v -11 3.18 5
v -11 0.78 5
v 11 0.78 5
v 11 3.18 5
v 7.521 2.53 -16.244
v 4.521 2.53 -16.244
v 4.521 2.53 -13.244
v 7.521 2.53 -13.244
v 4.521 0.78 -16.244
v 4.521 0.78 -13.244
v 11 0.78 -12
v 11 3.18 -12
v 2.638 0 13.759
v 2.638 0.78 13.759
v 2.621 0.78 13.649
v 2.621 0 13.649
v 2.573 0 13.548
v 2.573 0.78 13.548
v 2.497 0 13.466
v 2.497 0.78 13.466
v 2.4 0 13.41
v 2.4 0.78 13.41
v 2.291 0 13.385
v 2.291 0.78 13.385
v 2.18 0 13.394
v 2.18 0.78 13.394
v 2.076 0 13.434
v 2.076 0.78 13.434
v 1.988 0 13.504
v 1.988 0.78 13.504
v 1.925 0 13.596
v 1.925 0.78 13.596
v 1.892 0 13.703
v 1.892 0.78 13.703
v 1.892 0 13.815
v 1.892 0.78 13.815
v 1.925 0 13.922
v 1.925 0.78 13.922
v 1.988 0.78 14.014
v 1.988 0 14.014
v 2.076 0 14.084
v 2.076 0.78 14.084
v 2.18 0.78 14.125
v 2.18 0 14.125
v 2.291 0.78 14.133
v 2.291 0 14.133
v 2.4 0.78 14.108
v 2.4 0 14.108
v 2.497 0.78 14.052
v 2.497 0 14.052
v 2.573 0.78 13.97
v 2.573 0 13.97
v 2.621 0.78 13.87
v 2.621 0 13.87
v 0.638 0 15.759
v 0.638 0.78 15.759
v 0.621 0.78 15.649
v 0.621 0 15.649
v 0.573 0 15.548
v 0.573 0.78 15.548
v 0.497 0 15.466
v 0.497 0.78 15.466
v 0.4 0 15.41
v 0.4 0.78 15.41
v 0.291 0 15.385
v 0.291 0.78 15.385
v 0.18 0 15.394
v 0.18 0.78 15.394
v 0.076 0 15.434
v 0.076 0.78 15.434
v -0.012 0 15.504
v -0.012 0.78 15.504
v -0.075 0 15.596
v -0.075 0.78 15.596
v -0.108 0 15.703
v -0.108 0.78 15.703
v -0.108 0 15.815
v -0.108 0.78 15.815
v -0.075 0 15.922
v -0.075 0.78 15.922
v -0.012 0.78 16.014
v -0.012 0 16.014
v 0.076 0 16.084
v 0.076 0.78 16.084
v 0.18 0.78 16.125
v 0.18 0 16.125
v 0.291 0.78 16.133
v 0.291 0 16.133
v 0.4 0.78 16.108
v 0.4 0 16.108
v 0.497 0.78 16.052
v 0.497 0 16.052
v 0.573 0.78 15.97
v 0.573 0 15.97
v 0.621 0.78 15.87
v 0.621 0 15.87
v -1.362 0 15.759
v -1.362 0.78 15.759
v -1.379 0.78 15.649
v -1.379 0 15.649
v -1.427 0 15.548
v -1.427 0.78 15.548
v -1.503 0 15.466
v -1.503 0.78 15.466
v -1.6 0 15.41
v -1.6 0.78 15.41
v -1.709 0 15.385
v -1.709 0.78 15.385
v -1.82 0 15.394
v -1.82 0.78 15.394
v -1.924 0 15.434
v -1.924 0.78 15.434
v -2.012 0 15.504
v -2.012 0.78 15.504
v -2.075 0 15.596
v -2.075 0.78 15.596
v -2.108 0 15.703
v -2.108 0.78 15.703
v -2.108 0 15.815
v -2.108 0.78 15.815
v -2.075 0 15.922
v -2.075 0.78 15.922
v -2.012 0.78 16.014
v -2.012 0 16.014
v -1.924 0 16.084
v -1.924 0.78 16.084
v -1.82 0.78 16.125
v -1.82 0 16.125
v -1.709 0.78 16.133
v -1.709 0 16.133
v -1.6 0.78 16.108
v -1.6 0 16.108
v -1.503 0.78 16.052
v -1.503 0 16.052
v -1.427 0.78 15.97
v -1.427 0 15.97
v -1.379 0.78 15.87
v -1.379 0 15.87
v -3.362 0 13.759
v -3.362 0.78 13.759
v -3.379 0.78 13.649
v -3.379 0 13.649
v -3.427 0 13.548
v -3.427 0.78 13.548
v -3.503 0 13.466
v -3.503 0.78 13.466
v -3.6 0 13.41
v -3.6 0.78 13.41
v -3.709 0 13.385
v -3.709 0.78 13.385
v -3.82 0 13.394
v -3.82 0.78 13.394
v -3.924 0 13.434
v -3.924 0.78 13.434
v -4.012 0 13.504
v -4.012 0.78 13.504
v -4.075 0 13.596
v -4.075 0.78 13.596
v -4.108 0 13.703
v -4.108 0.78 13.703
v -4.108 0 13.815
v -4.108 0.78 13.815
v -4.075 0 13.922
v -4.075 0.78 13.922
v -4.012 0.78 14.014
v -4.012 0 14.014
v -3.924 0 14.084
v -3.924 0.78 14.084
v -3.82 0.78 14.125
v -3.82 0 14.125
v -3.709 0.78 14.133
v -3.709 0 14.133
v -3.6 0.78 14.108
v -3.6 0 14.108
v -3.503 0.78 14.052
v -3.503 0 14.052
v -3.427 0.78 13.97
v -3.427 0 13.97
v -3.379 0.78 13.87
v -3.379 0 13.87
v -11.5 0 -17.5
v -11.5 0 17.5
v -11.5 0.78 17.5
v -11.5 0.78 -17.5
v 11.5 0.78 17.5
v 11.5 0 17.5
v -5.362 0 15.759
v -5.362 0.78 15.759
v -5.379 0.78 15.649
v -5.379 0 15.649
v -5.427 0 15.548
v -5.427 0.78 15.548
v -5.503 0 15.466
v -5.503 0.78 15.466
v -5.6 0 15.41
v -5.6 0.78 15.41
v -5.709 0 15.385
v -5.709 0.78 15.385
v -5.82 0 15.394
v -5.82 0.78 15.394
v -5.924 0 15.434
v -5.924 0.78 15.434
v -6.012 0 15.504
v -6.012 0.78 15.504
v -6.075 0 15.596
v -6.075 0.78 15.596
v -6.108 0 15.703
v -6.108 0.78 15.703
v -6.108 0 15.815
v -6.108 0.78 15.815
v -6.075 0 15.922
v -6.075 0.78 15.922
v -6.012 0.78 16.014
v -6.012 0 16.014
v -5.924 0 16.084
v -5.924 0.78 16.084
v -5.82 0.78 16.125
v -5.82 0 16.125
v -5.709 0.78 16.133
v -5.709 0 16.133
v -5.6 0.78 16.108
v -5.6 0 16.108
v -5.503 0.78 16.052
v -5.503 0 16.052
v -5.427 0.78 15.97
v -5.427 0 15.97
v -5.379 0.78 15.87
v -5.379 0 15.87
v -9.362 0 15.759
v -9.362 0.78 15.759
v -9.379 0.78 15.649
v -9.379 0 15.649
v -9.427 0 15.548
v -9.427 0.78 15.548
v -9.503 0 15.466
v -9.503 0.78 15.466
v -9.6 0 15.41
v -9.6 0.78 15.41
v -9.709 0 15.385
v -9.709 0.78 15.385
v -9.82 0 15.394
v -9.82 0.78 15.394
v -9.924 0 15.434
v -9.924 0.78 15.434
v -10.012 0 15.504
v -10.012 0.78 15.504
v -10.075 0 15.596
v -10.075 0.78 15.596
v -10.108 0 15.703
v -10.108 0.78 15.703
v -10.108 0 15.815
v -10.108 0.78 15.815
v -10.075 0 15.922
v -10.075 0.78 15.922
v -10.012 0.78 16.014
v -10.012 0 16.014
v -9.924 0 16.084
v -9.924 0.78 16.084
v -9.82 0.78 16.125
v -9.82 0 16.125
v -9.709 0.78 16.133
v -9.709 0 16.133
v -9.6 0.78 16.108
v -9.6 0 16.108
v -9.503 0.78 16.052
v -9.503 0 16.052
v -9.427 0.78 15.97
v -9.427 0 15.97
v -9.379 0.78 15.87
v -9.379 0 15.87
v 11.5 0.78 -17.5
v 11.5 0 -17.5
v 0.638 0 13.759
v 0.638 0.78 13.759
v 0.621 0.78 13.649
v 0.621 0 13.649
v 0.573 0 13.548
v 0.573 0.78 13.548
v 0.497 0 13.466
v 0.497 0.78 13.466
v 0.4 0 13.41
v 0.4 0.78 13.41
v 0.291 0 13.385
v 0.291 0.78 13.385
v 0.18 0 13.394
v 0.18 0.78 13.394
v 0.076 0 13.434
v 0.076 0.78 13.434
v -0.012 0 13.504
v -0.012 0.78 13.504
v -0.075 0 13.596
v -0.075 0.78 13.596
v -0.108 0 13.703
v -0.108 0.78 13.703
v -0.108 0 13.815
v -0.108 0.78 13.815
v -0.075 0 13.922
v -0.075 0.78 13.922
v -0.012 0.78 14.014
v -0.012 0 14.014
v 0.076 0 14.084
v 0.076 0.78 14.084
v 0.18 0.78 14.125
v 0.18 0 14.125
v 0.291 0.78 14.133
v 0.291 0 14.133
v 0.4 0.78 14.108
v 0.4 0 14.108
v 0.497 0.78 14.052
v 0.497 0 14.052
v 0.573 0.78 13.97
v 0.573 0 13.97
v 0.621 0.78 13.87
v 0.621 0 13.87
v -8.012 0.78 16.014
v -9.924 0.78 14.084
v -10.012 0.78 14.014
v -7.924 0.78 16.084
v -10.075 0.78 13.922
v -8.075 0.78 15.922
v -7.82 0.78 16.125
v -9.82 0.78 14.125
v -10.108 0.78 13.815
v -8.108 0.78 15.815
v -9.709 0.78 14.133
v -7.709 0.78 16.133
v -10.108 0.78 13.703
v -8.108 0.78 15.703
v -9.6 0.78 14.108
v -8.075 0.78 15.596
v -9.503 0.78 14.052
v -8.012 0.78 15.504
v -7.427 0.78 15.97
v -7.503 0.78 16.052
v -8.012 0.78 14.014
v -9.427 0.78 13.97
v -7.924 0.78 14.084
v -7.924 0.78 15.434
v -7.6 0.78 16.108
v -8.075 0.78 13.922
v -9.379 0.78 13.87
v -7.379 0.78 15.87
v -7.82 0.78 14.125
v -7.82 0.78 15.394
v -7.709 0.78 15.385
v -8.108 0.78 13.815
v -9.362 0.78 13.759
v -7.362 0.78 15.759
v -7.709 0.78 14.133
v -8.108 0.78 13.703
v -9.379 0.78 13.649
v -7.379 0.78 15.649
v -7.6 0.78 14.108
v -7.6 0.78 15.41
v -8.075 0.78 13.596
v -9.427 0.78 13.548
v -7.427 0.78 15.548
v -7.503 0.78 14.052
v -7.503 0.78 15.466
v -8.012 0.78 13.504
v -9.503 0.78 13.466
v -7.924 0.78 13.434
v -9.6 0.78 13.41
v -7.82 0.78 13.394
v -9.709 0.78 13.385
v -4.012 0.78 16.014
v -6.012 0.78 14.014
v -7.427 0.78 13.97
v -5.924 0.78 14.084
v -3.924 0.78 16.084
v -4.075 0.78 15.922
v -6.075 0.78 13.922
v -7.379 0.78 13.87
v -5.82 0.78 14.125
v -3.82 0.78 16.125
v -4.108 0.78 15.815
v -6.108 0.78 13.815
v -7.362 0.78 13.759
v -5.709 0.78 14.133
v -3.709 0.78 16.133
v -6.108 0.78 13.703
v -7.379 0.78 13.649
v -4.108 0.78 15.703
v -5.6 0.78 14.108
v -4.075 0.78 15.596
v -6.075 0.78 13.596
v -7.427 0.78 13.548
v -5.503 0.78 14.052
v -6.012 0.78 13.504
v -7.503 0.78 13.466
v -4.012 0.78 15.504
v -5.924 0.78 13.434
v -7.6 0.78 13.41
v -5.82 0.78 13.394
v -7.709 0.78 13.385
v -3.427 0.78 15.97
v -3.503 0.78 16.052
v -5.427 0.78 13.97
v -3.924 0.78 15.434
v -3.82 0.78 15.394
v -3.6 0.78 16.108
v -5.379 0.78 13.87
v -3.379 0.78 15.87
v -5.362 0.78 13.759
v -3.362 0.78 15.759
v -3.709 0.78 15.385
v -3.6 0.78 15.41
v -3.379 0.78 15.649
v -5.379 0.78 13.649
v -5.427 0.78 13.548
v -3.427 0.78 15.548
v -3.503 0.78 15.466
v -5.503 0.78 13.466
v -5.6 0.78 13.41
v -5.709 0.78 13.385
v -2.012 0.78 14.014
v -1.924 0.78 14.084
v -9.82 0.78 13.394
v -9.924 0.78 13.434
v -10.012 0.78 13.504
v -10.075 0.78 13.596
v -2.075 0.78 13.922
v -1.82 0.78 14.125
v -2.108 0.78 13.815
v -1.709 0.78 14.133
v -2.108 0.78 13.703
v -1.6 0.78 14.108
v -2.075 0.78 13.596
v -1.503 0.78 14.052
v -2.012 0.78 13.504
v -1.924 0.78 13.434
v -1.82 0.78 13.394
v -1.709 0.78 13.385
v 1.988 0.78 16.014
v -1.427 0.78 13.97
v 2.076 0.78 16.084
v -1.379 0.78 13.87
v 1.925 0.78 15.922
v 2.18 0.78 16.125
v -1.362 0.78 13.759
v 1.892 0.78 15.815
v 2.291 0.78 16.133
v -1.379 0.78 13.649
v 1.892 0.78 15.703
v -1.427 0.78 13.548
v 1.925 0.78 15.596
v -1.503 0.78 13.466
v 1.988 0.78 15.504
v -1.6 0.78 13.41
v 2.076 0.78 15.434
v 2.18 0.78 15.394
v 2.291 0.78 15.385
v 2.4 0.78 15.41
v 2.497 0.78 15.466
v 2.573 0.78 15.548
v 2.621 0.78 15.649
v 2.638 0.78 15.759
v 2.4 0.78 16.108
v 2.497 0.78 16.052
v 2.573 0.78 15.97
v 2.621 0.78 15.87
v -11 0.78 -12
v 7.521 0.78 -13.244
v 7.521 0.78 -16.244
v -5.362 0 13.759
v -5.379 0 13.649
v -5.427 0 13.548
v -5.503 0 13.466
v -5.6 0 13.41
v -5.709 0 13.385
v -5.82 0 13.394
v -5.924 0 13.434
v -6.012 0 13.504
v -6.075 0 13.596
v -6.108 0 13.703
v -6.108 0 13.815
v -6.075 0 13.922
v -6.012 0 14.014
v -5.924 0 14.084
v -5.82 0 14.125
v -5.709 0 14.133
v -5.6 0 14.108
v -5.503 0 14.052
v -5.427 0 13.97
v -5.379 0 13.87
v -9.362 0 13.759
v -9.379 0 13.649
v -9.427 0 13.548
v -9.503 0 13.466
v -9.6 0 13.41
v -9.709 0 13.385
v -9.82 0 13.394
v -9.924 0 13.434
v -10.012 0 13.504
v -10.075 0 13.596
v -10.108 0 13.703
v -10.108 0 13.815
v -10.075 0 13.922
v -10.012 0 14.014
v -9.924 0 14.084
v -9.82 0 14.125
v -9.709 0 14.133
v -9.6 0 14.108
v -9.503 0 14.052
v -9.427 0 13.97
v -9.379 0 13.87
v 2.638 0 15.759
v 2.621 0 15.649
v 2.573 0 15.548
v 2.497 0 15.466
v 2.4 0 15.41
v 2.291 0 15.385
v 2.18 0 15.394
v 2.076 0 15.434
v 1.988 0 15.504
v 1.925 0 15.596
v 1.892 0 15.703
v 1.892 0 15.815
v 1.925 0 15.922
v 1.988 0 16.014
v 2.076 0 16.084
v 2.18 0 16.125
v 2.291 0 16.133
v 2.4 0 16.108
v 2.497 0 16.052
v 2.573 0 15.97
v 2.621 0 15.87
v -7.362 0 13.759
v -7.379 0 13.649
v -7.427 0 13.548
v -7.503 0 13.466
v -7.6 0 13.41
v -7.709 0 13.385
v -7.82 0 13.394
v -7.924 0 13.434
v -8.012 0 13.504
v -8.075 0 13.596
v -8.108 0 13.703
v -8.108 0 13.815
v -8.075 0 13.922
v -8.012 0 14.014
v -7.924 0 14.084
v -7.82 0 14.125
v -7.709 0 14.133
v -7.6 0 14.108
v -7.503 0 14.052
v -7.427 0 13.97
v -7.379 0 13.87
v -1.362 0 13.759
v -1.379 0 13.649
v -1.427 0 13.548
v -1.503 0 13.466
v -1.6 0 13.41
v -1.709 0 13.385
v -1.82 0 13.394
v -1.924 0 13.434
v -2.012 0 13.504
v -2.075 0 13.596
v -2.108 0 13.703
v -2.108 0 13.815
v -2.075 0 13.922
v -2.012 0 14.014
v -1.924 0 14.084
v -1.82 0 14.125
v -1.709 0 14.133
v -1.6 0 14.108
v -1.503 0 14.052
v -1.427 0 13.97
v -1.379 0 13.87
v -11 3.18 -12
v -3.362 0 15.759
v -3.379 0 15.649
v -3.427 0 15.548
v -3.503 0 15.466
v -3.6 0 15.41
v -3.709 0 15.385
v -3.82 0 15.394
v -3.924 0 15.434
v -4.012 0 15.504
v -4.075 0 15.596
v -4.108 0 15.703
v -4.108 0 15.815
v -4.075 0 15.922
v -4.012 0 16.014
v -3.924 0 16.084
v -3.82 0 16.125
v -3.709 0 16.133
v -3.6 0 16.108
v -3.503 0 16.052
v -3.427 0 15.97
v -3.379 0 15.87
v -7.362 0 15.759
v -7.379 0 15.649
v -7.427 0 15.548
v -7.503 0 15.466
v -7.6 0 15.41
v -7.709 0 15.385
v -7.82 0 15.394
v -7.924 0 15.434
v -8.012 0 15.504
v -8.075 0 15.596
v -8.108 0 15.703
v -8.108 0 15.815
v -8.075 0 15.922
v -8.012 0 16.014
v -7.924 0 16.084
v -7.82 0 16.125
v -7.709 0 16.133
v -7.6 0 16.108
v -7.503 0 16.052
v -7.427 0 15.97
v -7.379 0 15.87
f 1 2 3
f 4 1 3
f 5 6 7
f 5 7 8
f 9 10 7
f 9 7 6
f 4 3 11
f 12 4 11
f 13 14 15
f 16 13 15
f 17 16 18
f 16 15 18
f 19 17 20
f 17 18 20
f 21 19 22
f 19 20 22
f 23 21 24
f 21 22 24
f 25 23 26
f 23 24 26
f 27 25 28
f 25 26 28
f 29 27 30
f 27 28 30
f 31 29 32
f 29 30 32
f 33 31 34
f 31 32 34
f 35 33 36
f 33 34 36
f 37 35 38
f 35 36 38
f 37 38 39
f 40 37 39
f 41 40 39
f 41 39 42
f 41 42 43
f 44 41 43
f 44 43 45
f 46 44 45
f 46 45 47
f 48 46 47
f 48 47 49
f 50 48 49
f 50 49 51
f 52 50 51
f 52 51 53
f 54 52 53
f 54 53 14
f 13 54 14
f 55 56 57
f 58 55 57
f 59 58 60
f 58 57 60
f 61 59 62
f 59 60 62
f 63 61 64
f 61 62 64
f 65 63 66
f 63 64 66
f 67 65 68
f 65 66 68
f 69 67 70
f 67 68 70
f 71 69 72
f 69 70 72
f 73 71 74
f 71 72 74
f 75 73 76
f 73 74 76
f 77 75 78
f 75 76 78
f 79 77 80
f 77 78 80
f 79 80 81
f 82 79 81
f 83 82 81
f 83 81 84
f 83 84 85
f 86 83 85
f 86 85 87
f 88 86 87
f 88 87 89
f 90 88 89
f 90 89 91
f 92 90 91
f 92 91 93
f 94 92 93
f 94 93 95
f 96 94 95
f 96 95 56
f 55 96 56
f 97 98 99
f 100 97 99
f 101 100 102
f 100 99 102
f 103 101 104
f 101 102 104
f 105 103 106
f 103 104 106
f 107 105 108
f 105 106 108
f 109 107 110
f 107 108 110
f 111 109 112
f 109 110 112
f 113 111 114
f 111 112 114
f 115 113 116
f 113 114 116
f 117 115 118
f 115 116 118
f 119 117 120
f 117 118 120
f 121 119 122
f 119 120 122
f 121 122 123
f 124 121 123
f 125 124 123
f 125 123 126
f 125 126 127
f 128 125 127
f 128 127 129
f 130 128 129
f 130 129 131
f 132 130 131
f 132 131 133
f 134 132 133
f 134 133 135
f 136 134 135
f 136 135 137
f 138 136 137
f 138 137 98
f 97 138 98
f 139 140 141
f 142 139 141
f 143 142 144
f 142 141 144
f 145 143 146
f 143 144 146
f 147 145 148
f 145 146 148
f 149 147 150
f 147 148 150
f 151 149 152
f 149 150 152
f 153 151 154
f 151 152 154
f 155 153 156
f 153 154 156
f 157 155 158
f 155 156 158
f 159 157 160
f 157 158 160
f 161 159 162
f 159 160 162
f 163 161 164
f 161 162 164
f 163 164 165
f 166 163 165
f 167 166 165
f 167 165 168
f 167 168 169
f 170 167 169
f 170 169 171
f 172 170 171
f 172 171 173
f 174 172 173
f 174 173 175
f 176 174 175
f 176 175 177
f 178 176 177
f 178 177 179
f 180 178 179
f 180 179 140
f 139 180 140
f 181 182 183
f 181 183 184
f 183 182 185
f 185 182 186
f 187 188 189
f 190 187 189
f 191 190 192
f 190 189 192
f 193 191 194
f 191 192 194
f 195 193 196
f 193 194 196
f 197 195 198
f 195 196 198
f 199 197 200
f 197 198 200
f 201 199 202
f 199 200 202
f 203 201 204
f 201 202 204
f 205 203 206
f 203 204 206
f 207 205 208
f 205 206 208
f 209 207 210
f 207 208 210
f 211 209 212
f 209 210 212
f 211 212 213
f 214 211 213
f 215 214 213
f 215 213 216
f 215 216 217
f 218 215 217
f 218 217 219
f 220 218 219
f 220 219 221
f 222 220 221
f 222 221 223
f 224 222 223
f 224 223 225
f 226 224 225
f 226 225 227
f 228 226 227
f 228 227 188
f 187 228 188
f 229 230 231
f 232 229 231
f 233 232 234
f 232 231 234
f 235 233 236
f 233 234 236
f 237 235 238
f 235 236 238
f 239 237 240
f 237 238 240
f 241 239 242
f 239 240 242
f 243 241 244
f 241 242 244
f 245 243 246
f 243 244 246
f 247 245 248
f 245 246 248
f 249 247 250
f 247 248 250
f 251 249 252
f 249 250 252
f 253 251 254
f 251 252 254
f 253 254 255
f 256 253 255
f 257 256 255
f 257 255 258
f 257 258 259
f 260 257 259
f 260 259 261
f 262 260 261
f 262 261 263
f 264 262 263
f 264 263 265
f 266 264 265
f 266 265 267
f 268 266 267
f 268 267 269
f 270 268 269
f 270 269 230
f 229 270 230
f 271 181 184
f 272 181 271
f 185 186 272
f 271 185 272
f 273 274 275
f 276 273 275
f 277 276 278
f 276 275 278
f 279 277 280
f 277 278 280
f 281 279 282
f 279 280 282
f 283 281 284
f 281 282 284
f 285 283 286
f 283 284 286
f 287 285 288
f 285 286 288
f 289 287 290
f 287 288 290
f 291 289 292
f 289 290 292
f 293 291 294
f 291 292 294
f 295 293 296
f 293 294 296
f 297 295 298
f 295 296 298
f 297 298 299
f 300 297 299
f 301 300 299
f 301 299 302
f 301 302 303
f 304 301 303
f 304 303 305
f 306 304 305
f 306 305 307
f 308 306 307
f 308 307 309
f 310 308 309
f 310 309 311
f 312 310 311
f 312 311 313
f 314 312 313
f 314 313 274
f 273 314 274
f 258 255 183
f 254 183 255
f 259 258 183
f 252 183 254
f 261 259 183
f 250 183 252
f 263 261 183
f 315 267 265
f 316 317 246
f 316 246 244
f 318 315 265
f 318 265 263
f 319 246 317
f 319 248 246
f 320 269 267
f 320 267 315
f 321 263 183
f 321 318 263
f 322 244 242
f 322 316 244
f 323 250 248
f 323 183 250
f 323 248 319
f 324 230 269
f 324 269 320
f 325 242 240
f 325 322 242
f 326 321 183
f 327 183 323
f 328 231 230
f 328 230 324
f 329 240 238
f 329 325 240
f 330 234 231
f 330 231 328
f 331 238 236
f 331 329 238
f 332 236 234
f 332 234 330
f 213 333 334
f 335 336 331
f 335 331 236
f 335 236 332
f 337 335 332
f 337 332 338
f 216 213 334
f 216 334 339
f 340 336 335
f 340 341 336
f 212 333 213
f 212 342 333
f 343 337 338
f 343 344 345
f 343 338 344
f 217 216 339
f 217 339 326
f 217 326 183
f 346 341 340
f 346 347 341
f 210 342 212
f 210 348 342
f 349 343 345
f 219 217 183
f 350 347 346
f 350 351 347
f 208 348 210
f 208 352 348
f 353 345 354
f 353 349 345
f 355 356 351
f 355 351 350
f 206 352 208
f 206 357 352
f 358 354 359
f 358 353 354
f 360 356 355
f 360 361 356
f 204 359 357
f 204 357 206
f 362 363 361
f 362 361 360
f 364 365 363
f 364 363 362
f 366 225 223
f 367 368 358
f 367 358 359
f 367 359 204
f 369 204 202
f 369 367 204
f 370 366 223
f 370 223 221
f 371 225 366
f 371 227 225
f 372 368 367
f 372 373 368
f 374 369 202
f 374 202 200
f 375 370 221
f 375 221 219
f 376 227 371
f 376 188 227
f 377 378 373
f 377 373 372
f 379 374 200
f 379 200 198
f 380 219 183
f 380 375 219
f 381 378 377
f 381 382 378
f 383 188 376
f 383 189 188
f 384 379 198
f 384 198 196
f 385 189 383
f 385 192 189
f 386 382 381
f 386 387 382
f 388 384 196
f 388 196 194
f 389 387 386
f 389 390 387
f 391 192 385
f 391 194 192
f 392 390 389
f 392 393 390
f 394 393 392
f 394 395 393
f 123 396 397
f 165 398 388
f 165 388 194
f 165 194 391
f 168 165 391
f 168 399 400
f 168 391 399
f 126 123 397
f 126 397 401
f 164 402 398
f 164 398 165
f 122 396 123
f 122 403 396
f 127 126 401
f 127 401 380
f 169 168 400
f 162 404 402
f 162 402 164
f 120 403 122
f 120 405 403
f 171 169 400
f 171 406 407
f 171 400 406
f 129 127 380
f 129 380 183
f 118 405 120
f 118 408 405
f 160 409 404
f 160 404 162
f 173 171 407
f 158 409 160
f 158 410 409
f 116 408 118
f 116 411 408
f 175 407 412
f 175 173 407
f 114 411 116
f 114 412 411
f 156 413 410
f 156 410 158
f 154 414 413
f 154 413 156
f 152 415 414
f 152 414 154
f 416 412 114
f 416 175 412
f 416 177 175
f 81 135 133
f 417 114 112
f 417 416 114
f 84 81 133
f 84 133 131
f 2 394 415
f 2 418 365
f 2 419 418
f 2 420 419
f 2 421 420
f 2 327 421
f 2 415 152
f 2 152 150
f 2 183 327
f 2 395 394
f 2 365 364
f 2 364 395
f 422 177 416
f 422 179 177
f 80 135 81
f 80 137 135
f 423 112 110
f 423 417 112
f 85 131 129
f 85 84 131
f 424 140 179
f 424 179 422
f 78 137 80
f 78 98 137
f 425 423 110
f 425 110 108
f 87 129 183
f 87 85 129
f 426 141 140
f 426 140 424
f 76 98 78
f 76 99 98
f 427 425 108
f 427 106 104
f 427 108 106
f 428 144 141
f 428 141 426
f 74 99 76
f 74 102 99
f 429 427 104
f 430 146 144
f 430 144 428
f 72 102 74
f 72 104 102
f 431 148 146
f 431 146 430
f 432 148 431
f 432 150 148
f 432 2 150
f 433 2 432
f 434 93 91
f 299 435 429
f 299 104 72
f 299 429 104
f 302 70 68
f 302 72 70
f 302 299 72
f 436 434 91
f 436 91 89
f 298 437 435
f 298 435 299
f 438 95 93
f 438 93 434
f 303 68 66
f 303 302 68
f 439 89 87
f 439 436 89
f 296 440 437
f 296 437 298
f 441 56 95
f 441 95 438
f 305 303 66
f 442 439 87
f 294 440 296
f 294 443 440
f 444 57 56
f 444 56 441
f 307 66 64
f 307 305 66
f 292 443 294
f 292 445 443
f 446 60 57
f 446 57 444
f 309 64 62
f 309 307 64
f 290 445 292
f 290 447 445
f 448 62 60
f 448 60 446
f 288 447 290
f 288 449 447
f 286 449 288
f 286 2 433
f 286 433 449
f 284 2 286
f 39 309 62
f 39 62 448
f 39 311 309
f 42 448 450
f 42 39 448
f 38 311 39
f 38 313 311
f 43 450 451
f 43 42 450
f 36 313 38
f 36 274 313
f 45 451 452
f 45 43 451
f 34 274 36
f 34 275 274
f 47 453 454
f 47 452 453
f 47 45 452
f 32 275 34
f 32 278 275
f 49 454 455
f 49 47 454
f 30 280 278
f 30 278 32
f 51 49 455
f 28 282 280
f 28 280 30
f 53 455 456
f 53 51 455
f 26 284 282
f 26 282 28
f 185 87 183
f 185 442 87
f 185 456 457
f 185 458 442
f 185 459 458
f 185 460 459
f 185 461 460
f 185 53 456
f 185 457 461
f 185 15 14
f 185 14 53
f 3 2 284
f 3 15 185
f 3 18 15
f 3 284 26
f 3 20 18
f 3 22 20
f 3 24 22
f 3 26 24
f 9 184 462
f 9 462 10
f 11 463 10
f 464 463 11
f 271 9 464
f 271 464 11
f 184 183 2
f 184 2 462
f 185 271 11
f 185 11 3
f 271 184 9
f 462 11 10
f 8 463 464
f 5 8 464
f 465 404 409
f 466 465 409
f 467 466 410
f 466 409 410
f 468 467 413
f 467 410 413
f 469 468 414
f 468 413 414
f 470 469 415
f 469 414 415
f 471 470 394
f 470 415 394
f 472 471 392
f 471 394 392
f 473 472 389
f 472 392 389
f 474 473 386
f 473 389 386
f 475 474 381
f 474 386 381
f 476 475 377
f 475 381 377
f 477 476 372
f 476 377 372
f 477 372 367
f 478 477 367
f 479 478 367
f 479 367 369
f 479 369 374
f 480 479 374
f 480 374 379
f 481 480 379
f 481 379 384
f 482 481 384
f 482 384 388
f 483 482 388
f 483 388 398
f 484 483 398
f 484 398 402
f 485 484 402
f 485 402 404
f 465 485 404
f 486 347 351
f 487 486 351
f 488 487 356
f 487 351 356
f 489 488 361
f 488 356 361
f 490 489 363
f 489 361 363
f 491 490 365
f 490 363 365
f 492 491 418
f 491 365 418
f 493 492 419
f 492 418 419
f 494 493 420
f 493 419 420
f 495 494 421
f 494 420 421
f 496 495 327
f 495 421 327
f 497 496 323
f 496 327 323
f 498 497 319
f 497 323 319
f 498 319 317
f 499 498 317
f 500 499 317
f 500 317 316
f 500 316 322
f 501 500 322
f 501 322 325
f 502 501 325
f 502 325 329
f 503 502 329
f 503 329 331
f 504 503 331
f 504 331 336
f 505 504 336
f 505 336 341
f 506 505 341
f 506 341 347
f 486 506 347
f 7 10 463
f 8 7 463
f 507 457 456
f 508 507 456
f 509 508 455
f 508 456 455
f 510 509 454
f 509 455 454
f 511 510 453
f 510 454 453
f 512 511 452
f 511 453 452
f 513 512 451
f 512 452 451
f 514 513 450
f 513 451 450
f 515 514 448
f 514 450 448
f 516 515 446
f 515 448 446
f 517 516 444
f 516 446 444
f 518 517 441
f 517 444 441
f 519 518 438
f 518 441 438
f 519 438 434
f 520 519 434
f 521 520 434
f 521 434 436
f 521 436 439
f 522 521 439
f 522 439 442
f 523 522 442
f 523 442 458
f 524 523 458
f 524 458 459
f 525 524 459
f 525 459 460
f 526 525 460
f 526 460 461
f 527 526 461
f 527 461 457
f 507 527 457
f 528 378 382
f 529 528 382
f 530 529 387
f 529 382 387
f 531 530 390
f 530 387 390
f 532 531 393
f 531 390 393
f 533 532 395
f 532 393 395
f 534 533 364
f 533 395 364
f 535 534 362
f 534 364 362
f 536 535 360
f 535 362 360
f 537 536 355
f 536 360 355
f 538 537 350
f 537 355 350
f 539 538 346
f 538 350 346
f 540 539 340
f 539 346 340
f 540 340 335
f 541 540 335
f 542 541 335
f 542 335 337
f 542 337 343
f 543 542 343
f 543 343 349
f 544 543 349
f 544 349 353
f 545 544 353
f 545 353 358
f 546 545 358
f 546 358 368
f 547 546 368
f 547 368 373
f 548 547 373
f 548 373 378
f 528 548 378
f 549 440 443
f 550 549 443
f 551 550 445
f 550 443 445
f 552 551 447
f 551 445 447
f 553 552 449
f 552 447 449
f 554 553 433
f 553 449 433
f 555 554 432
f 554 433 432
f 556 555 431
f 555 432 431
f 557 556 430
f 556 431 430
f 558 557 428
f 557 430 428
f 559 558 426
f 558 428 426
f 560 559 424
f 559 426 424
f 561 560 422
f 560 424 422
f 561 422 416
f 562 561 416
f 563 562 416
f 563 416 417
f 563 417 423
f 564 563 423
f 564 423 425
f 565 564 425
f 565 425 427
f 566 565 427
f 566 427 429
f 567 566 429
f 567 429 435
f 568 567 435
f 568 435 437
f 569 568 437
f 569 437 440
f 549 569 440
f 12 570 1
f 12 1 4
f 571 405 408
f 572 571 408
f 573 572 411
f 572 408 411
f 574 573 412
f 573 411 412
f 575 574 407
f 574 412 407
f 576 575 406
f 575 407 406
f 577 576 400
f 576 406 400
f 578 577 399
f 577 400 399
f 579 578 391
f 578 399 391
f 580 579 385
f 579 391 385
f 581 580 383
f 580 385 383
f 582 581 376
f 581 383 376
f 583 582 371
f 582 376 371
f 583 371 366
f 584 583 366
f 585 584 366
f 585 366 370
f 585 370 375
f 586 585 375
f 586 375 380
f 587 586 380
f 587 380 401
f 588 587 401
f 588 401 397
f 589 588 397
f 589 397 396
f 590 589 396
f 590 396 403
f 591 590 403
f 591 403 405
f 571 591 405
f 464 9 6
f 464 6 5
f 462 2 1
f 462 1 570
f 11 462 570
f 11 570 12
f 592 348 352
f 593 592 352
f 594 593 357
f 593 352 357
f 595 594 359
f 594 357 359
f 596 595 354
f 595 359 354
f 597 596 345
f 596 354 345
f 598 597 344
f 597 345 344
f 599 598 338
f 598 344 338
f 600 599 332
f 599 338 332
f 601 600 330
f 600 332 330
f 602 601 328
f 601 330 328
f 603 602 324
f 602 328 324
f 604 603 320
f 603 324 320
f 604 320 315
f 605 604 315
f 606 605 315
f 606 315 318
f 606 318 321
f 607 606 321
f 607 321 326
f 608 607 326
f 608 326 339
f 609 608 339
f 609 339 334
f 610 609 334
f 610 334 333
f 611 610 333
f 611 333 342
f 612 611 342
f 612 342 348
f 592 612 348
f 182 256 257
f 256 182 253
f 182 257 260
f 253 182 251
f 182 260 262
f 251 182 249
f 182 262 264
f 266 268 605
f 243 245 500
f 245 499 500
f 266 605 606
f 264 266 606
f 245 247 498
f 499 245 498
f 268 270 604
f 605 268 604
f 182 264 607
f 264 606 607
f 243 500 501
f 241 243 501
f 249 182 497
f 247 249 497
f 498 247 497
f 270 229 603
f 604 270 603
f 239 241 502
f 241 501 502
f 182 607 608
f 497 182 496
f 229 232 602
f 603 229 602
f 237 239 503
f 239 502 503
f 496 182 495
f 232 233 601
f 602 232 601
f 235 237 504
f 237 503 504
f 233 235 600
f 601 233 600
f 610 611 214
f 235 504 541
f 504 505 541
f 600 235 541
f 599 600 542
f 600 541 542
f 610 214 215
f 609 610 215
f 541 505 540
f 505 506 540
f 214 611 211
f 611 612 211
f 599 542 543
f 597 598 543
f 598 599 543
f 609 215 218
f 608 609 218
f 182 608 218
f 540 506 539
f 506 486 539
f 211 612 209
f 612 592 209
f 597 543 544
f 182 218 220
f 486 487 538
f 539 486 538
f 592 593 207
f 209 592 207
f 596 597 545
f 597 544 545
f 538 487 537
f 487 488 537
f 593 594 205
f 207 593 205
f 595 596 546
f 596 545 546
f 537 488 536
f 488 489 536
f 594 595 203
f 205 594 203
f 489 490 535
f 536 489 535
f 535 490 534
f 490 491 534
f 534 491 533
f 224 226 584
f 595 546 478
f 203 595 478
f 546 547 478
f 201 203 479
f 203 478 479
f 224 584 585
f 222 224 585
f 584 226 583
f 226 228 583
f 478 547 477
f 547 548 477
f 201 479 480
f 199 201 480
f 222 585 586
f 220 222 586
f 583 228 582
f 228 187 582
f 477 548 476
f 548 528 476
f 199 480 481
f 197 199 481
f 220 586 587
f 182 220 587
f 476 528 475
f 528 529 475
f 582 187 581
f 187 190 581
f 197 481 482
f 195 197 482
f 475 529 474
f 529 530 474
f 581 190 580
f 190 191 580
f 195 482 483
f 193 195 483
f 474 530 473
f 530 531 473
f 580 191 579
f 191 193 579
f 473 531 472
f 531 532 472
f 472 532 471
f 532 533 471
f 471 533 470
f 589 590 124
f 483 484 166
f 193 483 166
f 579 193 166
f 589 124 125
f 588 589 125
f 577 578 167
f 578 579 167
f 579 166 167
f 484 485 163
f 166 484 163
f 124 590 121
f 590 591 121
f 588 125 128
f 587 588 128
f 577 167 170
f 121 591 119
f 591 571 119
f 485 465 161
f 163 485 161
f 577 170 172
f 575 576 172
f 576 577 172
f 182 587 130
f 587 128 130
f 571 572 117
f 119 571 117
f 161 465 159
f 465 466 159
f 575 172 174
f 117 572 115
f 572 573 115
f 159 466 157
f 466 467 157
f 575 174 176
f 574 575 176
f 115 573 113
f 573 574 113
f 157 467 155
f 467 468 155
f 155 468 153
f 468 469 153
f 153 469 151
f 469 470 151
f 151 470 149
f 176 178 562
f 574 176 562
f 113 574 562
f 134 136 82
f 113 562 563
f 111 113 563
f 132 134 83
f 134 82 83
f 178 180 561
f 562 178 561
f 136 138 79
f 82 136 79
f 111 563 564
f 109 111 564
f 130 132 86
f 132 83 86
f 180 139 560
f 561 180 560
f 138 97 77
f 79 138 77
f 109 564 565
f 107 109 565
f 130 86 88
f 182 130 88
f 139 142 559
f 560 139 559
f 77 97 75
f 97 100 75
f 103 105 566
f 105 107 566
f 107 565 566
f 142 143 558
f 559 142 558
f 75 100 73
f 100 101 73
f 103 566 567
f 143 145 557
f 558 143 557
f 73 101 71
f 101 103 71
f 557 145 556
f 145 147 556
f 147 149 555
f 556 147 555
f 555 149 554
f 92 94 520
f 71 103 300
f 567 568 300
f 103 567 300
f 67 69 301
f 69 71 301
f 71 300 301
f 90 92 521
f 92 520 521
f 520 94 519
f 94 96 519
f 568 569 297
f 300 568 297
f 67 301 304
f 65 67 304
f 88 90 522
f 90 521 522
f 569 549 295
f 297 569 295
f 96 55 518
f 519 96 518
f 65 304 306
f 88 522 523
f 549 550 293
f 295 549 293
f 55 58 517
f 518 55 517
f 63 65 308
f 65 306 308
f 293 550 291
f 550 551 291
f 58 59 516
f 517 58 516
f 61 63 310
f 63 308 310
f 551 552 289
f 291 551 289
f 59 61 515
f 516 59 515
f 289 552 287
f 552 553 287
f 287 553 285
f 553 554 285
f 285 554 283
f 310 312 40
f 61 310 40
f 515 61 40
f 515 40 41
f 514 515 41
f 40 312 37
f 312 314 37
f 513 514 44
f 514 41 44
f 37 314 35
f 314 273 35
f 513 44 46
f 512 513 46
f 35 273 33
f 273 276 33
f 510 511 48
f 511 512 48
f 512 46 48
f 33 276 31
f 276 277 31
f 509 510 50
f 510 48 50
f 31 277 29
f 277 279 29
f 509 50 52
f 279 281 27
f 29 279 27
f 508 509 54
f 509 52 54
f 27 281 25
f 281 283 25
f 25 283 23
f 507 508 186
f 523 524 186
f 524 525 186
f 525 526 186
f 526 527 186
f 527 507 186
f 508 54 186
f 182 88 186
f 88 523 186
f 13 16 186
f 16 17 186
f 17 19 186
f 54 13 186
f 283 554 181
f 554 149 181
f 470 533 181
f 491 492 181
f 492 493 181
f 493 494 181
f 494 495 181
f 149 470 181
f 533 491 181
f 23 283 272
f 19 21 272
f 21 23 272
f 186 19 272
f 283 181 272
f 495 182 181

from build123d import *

# Parameters (mm, degrees)
SKETCH1_W           = 23
SKETCH1_H           = 35
BOSS_EXTRUDE1_DEPTH = 0.78
SKETCH2_W           = 22
SKETCH2_H           = 17
BOSS_EXTRUDE2_DEPTH = 2.4
SKETCH3_W           = 3
SKETCH3_H           = 3
BOSS_EXTRUDE3_DEPTH = 1.75
SKETCH4_R           = 0.375
CUT_EXTRUDE1_DEPTH  = 1.78


with BuildPart() as part:
    # Sketch1 → Boss-Extrude1 (new body)
    with BuildSketch(Plane(origin=(0, 0, 0), x_dir=(1, 0, 0), z_dir=(0, 1, 0))):
        Rectangle(SKETCH1_W, SKETCH1_H)
    extrude(amount=BOSS_EXTRUDE1_DEPTH)

    # Sketch2 → Boss-Extrude2 (add)
    with BuildSketch(Plane(origin=(0, 0.78, 0), x_dir=(1, 0, 0), z_dir=(0, 1, 0))):
        with Locations((0, 3.5)):
            Rectangle(SKETCH2_W, SKETCH2_H)
    extrude(amount=BOSS_EXTRUDE2_DEPTH)

    # Sketch3 → Boss-Extrude3 (add)
    with BuildSketch(Plane(origin=(0, 0.78, 0), x_dir=(1, 0, 0), z_dir=(0, 1, 0))):
        with Locations((6.021341325, 14.744149298)):
            Rectangle(SKETCH3_W, SKETCH3_H)
    extrude(amount=BOSS_EXTRUDE3_DEPTH)

    # Sketch4 → Cut-Extrude1 (cut, through all)
    with BuildSketch(Plane(origin=(0, 0.78, 0), x_dir=(1, 0, 0), z_dir=(0, 1, 0))):
        with Locations((-9.736937967, -15.759105546)):
            Circle(SKETCH4_R)
        with Locations((-7.736937967, -15.759105546)):
            Circle(SKETCH4_R)
        with Locations((-5.736937967, -15.759105546)):
            Circle(SKETCH4_R)
        with Locations((-3.736937967, -15.759105546)):
            Circle(SKETCH4_R)
        with Locations((-1.736937967, -15.759105546)):
            Circle(SKETCH4_R)
        with Locations((0.263062033, -15.759105546)):
            Circle(SKETCH4_R)
        with Locations((2.263062033, -15.759105546)):
            Circle(SKETCH4_R)
        with Locations((-7.736937967, -13.759105546)):
            Circle(SKETCH4_R)
        with Locations((-5.736937967, -13.759105546)):
            Circle(SKETCH4_R)
        with Locations((-3.736937967, -13.759105546)):
            Circle(SKETCH4_R)
        with Locations((-1.736937967, -13.759105546)):
            Circle(SKETCH4_R)
        with Locations((0.263062033, -13.759105546)):
            Circle(SKETCH4_R)
        with Locations((2.263062033, -13.759105546)):
            Circle(SKETCH4_R)
        with Locations((-9.736937967, -13.759105546)):
            Circle(SKETCH4_R)
    extrude(amount=-CUT_EXTRUDE1_DEPTH, mode=Mode.SUBTRACT)


solid = part.part
